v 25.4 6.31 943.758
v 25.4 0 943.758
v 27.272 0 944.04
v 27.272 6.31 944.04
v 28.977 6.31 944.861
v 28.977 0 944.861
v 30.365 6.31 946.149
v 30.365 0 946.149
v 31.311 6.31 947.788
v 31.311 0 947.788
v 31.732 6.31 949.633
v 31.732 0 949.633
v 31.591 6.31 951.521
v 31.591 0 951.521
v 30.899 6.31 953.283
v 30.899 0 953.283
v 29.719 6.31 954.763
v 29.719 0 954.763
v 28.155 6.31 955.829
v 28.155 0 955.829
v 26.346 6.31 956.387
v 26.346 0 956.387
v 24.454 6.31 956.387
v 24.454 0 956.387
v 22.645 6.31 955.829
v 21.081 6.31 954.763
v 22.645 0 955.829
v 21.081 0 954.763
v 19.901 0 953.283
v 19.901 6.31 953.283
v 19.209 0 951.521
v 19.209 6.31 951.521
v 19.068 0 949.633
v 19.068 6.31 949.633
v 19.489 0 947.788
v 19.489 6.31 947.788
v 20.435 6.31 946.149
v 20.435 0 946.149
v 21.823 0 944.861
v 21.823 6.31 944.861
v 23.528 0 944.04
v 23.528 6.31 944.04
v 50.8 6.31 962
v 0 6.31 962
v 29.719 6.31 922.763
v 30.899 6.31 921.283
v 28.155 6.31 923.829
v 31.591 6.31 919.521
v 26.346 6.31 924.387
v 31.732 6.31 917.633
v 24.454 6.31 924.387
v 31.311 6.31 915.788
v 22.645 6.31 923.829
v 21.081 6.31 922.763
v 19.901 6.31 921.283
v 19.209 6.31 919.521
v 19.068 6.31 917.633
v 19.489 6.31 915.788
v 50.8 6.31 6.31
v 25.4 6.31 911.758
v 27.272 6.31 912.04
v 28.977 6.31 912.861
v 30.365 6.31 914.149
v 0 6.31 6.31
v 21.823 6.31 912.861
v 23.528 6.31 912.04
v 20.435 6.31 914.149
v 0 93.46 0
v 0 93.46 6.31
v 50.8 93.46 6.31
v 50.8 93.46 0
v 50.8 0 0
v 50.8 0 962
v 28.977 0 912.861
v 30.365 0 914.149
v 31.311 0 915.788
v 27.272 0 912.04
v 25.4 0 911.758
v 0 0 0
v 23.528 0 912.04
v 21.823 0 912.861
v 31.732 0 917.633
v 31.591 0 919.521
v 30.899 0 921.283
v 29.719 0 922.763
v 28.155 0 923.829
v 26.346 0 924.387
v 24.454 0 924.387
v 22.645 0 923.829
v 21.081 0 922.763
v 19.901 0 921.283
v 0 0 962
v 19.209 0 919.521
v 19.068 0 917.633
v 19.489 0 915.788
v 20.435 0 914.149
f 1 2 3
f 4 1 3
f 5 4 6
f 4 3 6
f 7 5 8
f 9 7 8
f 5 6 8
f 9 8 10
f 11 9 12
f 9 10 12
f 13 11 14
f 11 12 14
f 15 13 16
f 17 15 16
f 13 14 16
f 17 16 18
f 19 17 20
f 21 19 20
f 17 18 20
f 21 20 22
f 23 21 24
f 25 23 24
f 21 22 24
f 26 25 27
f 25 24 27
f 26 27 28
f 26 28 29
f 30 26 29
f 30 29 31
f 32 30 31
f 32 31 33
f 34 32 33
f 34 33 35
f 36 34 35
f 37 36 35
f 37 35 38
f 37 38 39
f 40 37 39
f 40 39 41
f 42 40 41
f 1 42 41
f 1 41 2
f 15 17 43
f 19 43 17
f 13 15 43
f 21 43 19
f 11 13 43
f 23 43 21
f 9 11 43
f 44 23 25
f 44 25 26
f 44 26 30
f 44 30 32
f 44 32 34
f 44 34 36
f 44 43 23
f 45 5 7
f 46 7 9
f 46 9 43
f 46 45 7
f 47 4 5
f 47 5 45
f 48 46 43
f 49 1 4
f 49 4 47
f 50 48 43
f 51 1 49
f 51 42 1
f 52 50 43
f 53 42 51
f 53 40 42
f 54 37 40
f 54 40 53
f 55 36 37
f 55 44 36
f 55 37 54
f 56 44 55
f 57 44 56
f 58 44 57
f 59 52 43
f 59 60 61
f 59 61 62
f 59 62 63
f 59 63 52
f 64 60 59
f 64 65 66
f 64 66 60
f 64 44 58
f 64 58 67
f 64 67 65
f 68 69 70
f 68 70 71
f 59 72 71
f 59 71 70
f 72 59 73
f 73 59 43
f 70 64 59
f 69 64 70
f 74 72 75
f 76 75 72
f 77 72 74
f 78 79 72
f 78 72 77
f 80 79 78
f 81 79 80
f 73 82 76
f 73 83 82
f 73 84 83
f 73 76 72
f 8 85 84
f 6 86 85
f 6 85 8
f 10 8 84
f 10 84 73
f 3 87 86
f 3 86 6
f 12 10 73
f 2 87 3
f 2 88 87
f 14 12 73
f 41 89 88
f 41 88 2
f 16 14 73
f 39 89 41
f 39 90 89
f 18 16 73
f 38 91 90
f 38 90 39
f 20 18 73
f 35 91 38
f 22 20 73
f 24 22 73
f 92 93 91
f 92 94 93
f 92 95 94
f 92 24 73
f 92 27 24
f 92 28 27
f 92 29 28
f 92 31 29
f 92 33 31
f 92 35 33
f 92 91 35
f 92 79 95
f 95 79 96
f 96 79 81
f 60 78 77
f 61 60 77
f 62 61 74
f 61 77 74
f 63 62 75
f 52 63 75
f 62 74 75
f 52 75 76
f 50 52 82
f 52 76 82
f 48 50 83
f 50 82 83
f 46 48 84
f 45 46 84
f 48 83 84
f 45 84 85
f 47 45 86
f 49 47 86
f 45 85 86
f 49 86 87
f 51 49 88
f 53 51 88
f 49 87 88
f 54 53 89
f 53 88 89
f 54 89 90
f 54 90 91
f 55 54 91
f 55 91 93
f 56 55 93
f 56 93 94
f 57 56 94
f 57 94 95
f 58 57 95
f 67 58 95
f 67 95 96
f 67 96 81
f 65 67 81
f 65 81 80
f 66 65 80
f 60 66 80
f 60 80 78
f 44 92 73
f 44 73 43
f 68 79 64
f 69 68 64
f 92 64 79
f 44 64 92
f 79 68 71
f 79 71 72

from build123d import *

# Parameters (mm, degrees)
SALIENTE_EXTRUIR1_DEPTH = 50.8
CROQUIS6_R              = 6.35
CORTAR_EXTRUIR1_DEPTH   = 10


with BuildPart() as part:
    # Croquis1 → Saliente-Extruir1 (new body)
    with BuildSketch(Plane(origin=(0, 0, 0), x_dir=(0, 0, -1), z_dir=(1, 0, 0))):
        Polygon((-6.31, 93.46), (0, 93.46), (0, 0), (-962, 0), (-962, 6.31), (-6.31, 6.31), align=None)
    extrude(amount=SALIENTE_EXTRUIR1_DEPTH)

    # Croquis6 → Cortar-Extruir1 (cut)
    with BuildSketch(Plane.XZ):
        with Locations(Location((25.4, 918.107795334, 0), (0, 0, 270))):
            Circle(CROQUIS6_R)
        with Locations(Location((25.4, 950.107795334, 0), (0, 0, 270))):
            Circle(CROQUIS6_R)
    extrude(amount=-CORTAR_EXTRUIR1_DEPTH, mode=Mode.SUBTRACT)


solid = part.part
